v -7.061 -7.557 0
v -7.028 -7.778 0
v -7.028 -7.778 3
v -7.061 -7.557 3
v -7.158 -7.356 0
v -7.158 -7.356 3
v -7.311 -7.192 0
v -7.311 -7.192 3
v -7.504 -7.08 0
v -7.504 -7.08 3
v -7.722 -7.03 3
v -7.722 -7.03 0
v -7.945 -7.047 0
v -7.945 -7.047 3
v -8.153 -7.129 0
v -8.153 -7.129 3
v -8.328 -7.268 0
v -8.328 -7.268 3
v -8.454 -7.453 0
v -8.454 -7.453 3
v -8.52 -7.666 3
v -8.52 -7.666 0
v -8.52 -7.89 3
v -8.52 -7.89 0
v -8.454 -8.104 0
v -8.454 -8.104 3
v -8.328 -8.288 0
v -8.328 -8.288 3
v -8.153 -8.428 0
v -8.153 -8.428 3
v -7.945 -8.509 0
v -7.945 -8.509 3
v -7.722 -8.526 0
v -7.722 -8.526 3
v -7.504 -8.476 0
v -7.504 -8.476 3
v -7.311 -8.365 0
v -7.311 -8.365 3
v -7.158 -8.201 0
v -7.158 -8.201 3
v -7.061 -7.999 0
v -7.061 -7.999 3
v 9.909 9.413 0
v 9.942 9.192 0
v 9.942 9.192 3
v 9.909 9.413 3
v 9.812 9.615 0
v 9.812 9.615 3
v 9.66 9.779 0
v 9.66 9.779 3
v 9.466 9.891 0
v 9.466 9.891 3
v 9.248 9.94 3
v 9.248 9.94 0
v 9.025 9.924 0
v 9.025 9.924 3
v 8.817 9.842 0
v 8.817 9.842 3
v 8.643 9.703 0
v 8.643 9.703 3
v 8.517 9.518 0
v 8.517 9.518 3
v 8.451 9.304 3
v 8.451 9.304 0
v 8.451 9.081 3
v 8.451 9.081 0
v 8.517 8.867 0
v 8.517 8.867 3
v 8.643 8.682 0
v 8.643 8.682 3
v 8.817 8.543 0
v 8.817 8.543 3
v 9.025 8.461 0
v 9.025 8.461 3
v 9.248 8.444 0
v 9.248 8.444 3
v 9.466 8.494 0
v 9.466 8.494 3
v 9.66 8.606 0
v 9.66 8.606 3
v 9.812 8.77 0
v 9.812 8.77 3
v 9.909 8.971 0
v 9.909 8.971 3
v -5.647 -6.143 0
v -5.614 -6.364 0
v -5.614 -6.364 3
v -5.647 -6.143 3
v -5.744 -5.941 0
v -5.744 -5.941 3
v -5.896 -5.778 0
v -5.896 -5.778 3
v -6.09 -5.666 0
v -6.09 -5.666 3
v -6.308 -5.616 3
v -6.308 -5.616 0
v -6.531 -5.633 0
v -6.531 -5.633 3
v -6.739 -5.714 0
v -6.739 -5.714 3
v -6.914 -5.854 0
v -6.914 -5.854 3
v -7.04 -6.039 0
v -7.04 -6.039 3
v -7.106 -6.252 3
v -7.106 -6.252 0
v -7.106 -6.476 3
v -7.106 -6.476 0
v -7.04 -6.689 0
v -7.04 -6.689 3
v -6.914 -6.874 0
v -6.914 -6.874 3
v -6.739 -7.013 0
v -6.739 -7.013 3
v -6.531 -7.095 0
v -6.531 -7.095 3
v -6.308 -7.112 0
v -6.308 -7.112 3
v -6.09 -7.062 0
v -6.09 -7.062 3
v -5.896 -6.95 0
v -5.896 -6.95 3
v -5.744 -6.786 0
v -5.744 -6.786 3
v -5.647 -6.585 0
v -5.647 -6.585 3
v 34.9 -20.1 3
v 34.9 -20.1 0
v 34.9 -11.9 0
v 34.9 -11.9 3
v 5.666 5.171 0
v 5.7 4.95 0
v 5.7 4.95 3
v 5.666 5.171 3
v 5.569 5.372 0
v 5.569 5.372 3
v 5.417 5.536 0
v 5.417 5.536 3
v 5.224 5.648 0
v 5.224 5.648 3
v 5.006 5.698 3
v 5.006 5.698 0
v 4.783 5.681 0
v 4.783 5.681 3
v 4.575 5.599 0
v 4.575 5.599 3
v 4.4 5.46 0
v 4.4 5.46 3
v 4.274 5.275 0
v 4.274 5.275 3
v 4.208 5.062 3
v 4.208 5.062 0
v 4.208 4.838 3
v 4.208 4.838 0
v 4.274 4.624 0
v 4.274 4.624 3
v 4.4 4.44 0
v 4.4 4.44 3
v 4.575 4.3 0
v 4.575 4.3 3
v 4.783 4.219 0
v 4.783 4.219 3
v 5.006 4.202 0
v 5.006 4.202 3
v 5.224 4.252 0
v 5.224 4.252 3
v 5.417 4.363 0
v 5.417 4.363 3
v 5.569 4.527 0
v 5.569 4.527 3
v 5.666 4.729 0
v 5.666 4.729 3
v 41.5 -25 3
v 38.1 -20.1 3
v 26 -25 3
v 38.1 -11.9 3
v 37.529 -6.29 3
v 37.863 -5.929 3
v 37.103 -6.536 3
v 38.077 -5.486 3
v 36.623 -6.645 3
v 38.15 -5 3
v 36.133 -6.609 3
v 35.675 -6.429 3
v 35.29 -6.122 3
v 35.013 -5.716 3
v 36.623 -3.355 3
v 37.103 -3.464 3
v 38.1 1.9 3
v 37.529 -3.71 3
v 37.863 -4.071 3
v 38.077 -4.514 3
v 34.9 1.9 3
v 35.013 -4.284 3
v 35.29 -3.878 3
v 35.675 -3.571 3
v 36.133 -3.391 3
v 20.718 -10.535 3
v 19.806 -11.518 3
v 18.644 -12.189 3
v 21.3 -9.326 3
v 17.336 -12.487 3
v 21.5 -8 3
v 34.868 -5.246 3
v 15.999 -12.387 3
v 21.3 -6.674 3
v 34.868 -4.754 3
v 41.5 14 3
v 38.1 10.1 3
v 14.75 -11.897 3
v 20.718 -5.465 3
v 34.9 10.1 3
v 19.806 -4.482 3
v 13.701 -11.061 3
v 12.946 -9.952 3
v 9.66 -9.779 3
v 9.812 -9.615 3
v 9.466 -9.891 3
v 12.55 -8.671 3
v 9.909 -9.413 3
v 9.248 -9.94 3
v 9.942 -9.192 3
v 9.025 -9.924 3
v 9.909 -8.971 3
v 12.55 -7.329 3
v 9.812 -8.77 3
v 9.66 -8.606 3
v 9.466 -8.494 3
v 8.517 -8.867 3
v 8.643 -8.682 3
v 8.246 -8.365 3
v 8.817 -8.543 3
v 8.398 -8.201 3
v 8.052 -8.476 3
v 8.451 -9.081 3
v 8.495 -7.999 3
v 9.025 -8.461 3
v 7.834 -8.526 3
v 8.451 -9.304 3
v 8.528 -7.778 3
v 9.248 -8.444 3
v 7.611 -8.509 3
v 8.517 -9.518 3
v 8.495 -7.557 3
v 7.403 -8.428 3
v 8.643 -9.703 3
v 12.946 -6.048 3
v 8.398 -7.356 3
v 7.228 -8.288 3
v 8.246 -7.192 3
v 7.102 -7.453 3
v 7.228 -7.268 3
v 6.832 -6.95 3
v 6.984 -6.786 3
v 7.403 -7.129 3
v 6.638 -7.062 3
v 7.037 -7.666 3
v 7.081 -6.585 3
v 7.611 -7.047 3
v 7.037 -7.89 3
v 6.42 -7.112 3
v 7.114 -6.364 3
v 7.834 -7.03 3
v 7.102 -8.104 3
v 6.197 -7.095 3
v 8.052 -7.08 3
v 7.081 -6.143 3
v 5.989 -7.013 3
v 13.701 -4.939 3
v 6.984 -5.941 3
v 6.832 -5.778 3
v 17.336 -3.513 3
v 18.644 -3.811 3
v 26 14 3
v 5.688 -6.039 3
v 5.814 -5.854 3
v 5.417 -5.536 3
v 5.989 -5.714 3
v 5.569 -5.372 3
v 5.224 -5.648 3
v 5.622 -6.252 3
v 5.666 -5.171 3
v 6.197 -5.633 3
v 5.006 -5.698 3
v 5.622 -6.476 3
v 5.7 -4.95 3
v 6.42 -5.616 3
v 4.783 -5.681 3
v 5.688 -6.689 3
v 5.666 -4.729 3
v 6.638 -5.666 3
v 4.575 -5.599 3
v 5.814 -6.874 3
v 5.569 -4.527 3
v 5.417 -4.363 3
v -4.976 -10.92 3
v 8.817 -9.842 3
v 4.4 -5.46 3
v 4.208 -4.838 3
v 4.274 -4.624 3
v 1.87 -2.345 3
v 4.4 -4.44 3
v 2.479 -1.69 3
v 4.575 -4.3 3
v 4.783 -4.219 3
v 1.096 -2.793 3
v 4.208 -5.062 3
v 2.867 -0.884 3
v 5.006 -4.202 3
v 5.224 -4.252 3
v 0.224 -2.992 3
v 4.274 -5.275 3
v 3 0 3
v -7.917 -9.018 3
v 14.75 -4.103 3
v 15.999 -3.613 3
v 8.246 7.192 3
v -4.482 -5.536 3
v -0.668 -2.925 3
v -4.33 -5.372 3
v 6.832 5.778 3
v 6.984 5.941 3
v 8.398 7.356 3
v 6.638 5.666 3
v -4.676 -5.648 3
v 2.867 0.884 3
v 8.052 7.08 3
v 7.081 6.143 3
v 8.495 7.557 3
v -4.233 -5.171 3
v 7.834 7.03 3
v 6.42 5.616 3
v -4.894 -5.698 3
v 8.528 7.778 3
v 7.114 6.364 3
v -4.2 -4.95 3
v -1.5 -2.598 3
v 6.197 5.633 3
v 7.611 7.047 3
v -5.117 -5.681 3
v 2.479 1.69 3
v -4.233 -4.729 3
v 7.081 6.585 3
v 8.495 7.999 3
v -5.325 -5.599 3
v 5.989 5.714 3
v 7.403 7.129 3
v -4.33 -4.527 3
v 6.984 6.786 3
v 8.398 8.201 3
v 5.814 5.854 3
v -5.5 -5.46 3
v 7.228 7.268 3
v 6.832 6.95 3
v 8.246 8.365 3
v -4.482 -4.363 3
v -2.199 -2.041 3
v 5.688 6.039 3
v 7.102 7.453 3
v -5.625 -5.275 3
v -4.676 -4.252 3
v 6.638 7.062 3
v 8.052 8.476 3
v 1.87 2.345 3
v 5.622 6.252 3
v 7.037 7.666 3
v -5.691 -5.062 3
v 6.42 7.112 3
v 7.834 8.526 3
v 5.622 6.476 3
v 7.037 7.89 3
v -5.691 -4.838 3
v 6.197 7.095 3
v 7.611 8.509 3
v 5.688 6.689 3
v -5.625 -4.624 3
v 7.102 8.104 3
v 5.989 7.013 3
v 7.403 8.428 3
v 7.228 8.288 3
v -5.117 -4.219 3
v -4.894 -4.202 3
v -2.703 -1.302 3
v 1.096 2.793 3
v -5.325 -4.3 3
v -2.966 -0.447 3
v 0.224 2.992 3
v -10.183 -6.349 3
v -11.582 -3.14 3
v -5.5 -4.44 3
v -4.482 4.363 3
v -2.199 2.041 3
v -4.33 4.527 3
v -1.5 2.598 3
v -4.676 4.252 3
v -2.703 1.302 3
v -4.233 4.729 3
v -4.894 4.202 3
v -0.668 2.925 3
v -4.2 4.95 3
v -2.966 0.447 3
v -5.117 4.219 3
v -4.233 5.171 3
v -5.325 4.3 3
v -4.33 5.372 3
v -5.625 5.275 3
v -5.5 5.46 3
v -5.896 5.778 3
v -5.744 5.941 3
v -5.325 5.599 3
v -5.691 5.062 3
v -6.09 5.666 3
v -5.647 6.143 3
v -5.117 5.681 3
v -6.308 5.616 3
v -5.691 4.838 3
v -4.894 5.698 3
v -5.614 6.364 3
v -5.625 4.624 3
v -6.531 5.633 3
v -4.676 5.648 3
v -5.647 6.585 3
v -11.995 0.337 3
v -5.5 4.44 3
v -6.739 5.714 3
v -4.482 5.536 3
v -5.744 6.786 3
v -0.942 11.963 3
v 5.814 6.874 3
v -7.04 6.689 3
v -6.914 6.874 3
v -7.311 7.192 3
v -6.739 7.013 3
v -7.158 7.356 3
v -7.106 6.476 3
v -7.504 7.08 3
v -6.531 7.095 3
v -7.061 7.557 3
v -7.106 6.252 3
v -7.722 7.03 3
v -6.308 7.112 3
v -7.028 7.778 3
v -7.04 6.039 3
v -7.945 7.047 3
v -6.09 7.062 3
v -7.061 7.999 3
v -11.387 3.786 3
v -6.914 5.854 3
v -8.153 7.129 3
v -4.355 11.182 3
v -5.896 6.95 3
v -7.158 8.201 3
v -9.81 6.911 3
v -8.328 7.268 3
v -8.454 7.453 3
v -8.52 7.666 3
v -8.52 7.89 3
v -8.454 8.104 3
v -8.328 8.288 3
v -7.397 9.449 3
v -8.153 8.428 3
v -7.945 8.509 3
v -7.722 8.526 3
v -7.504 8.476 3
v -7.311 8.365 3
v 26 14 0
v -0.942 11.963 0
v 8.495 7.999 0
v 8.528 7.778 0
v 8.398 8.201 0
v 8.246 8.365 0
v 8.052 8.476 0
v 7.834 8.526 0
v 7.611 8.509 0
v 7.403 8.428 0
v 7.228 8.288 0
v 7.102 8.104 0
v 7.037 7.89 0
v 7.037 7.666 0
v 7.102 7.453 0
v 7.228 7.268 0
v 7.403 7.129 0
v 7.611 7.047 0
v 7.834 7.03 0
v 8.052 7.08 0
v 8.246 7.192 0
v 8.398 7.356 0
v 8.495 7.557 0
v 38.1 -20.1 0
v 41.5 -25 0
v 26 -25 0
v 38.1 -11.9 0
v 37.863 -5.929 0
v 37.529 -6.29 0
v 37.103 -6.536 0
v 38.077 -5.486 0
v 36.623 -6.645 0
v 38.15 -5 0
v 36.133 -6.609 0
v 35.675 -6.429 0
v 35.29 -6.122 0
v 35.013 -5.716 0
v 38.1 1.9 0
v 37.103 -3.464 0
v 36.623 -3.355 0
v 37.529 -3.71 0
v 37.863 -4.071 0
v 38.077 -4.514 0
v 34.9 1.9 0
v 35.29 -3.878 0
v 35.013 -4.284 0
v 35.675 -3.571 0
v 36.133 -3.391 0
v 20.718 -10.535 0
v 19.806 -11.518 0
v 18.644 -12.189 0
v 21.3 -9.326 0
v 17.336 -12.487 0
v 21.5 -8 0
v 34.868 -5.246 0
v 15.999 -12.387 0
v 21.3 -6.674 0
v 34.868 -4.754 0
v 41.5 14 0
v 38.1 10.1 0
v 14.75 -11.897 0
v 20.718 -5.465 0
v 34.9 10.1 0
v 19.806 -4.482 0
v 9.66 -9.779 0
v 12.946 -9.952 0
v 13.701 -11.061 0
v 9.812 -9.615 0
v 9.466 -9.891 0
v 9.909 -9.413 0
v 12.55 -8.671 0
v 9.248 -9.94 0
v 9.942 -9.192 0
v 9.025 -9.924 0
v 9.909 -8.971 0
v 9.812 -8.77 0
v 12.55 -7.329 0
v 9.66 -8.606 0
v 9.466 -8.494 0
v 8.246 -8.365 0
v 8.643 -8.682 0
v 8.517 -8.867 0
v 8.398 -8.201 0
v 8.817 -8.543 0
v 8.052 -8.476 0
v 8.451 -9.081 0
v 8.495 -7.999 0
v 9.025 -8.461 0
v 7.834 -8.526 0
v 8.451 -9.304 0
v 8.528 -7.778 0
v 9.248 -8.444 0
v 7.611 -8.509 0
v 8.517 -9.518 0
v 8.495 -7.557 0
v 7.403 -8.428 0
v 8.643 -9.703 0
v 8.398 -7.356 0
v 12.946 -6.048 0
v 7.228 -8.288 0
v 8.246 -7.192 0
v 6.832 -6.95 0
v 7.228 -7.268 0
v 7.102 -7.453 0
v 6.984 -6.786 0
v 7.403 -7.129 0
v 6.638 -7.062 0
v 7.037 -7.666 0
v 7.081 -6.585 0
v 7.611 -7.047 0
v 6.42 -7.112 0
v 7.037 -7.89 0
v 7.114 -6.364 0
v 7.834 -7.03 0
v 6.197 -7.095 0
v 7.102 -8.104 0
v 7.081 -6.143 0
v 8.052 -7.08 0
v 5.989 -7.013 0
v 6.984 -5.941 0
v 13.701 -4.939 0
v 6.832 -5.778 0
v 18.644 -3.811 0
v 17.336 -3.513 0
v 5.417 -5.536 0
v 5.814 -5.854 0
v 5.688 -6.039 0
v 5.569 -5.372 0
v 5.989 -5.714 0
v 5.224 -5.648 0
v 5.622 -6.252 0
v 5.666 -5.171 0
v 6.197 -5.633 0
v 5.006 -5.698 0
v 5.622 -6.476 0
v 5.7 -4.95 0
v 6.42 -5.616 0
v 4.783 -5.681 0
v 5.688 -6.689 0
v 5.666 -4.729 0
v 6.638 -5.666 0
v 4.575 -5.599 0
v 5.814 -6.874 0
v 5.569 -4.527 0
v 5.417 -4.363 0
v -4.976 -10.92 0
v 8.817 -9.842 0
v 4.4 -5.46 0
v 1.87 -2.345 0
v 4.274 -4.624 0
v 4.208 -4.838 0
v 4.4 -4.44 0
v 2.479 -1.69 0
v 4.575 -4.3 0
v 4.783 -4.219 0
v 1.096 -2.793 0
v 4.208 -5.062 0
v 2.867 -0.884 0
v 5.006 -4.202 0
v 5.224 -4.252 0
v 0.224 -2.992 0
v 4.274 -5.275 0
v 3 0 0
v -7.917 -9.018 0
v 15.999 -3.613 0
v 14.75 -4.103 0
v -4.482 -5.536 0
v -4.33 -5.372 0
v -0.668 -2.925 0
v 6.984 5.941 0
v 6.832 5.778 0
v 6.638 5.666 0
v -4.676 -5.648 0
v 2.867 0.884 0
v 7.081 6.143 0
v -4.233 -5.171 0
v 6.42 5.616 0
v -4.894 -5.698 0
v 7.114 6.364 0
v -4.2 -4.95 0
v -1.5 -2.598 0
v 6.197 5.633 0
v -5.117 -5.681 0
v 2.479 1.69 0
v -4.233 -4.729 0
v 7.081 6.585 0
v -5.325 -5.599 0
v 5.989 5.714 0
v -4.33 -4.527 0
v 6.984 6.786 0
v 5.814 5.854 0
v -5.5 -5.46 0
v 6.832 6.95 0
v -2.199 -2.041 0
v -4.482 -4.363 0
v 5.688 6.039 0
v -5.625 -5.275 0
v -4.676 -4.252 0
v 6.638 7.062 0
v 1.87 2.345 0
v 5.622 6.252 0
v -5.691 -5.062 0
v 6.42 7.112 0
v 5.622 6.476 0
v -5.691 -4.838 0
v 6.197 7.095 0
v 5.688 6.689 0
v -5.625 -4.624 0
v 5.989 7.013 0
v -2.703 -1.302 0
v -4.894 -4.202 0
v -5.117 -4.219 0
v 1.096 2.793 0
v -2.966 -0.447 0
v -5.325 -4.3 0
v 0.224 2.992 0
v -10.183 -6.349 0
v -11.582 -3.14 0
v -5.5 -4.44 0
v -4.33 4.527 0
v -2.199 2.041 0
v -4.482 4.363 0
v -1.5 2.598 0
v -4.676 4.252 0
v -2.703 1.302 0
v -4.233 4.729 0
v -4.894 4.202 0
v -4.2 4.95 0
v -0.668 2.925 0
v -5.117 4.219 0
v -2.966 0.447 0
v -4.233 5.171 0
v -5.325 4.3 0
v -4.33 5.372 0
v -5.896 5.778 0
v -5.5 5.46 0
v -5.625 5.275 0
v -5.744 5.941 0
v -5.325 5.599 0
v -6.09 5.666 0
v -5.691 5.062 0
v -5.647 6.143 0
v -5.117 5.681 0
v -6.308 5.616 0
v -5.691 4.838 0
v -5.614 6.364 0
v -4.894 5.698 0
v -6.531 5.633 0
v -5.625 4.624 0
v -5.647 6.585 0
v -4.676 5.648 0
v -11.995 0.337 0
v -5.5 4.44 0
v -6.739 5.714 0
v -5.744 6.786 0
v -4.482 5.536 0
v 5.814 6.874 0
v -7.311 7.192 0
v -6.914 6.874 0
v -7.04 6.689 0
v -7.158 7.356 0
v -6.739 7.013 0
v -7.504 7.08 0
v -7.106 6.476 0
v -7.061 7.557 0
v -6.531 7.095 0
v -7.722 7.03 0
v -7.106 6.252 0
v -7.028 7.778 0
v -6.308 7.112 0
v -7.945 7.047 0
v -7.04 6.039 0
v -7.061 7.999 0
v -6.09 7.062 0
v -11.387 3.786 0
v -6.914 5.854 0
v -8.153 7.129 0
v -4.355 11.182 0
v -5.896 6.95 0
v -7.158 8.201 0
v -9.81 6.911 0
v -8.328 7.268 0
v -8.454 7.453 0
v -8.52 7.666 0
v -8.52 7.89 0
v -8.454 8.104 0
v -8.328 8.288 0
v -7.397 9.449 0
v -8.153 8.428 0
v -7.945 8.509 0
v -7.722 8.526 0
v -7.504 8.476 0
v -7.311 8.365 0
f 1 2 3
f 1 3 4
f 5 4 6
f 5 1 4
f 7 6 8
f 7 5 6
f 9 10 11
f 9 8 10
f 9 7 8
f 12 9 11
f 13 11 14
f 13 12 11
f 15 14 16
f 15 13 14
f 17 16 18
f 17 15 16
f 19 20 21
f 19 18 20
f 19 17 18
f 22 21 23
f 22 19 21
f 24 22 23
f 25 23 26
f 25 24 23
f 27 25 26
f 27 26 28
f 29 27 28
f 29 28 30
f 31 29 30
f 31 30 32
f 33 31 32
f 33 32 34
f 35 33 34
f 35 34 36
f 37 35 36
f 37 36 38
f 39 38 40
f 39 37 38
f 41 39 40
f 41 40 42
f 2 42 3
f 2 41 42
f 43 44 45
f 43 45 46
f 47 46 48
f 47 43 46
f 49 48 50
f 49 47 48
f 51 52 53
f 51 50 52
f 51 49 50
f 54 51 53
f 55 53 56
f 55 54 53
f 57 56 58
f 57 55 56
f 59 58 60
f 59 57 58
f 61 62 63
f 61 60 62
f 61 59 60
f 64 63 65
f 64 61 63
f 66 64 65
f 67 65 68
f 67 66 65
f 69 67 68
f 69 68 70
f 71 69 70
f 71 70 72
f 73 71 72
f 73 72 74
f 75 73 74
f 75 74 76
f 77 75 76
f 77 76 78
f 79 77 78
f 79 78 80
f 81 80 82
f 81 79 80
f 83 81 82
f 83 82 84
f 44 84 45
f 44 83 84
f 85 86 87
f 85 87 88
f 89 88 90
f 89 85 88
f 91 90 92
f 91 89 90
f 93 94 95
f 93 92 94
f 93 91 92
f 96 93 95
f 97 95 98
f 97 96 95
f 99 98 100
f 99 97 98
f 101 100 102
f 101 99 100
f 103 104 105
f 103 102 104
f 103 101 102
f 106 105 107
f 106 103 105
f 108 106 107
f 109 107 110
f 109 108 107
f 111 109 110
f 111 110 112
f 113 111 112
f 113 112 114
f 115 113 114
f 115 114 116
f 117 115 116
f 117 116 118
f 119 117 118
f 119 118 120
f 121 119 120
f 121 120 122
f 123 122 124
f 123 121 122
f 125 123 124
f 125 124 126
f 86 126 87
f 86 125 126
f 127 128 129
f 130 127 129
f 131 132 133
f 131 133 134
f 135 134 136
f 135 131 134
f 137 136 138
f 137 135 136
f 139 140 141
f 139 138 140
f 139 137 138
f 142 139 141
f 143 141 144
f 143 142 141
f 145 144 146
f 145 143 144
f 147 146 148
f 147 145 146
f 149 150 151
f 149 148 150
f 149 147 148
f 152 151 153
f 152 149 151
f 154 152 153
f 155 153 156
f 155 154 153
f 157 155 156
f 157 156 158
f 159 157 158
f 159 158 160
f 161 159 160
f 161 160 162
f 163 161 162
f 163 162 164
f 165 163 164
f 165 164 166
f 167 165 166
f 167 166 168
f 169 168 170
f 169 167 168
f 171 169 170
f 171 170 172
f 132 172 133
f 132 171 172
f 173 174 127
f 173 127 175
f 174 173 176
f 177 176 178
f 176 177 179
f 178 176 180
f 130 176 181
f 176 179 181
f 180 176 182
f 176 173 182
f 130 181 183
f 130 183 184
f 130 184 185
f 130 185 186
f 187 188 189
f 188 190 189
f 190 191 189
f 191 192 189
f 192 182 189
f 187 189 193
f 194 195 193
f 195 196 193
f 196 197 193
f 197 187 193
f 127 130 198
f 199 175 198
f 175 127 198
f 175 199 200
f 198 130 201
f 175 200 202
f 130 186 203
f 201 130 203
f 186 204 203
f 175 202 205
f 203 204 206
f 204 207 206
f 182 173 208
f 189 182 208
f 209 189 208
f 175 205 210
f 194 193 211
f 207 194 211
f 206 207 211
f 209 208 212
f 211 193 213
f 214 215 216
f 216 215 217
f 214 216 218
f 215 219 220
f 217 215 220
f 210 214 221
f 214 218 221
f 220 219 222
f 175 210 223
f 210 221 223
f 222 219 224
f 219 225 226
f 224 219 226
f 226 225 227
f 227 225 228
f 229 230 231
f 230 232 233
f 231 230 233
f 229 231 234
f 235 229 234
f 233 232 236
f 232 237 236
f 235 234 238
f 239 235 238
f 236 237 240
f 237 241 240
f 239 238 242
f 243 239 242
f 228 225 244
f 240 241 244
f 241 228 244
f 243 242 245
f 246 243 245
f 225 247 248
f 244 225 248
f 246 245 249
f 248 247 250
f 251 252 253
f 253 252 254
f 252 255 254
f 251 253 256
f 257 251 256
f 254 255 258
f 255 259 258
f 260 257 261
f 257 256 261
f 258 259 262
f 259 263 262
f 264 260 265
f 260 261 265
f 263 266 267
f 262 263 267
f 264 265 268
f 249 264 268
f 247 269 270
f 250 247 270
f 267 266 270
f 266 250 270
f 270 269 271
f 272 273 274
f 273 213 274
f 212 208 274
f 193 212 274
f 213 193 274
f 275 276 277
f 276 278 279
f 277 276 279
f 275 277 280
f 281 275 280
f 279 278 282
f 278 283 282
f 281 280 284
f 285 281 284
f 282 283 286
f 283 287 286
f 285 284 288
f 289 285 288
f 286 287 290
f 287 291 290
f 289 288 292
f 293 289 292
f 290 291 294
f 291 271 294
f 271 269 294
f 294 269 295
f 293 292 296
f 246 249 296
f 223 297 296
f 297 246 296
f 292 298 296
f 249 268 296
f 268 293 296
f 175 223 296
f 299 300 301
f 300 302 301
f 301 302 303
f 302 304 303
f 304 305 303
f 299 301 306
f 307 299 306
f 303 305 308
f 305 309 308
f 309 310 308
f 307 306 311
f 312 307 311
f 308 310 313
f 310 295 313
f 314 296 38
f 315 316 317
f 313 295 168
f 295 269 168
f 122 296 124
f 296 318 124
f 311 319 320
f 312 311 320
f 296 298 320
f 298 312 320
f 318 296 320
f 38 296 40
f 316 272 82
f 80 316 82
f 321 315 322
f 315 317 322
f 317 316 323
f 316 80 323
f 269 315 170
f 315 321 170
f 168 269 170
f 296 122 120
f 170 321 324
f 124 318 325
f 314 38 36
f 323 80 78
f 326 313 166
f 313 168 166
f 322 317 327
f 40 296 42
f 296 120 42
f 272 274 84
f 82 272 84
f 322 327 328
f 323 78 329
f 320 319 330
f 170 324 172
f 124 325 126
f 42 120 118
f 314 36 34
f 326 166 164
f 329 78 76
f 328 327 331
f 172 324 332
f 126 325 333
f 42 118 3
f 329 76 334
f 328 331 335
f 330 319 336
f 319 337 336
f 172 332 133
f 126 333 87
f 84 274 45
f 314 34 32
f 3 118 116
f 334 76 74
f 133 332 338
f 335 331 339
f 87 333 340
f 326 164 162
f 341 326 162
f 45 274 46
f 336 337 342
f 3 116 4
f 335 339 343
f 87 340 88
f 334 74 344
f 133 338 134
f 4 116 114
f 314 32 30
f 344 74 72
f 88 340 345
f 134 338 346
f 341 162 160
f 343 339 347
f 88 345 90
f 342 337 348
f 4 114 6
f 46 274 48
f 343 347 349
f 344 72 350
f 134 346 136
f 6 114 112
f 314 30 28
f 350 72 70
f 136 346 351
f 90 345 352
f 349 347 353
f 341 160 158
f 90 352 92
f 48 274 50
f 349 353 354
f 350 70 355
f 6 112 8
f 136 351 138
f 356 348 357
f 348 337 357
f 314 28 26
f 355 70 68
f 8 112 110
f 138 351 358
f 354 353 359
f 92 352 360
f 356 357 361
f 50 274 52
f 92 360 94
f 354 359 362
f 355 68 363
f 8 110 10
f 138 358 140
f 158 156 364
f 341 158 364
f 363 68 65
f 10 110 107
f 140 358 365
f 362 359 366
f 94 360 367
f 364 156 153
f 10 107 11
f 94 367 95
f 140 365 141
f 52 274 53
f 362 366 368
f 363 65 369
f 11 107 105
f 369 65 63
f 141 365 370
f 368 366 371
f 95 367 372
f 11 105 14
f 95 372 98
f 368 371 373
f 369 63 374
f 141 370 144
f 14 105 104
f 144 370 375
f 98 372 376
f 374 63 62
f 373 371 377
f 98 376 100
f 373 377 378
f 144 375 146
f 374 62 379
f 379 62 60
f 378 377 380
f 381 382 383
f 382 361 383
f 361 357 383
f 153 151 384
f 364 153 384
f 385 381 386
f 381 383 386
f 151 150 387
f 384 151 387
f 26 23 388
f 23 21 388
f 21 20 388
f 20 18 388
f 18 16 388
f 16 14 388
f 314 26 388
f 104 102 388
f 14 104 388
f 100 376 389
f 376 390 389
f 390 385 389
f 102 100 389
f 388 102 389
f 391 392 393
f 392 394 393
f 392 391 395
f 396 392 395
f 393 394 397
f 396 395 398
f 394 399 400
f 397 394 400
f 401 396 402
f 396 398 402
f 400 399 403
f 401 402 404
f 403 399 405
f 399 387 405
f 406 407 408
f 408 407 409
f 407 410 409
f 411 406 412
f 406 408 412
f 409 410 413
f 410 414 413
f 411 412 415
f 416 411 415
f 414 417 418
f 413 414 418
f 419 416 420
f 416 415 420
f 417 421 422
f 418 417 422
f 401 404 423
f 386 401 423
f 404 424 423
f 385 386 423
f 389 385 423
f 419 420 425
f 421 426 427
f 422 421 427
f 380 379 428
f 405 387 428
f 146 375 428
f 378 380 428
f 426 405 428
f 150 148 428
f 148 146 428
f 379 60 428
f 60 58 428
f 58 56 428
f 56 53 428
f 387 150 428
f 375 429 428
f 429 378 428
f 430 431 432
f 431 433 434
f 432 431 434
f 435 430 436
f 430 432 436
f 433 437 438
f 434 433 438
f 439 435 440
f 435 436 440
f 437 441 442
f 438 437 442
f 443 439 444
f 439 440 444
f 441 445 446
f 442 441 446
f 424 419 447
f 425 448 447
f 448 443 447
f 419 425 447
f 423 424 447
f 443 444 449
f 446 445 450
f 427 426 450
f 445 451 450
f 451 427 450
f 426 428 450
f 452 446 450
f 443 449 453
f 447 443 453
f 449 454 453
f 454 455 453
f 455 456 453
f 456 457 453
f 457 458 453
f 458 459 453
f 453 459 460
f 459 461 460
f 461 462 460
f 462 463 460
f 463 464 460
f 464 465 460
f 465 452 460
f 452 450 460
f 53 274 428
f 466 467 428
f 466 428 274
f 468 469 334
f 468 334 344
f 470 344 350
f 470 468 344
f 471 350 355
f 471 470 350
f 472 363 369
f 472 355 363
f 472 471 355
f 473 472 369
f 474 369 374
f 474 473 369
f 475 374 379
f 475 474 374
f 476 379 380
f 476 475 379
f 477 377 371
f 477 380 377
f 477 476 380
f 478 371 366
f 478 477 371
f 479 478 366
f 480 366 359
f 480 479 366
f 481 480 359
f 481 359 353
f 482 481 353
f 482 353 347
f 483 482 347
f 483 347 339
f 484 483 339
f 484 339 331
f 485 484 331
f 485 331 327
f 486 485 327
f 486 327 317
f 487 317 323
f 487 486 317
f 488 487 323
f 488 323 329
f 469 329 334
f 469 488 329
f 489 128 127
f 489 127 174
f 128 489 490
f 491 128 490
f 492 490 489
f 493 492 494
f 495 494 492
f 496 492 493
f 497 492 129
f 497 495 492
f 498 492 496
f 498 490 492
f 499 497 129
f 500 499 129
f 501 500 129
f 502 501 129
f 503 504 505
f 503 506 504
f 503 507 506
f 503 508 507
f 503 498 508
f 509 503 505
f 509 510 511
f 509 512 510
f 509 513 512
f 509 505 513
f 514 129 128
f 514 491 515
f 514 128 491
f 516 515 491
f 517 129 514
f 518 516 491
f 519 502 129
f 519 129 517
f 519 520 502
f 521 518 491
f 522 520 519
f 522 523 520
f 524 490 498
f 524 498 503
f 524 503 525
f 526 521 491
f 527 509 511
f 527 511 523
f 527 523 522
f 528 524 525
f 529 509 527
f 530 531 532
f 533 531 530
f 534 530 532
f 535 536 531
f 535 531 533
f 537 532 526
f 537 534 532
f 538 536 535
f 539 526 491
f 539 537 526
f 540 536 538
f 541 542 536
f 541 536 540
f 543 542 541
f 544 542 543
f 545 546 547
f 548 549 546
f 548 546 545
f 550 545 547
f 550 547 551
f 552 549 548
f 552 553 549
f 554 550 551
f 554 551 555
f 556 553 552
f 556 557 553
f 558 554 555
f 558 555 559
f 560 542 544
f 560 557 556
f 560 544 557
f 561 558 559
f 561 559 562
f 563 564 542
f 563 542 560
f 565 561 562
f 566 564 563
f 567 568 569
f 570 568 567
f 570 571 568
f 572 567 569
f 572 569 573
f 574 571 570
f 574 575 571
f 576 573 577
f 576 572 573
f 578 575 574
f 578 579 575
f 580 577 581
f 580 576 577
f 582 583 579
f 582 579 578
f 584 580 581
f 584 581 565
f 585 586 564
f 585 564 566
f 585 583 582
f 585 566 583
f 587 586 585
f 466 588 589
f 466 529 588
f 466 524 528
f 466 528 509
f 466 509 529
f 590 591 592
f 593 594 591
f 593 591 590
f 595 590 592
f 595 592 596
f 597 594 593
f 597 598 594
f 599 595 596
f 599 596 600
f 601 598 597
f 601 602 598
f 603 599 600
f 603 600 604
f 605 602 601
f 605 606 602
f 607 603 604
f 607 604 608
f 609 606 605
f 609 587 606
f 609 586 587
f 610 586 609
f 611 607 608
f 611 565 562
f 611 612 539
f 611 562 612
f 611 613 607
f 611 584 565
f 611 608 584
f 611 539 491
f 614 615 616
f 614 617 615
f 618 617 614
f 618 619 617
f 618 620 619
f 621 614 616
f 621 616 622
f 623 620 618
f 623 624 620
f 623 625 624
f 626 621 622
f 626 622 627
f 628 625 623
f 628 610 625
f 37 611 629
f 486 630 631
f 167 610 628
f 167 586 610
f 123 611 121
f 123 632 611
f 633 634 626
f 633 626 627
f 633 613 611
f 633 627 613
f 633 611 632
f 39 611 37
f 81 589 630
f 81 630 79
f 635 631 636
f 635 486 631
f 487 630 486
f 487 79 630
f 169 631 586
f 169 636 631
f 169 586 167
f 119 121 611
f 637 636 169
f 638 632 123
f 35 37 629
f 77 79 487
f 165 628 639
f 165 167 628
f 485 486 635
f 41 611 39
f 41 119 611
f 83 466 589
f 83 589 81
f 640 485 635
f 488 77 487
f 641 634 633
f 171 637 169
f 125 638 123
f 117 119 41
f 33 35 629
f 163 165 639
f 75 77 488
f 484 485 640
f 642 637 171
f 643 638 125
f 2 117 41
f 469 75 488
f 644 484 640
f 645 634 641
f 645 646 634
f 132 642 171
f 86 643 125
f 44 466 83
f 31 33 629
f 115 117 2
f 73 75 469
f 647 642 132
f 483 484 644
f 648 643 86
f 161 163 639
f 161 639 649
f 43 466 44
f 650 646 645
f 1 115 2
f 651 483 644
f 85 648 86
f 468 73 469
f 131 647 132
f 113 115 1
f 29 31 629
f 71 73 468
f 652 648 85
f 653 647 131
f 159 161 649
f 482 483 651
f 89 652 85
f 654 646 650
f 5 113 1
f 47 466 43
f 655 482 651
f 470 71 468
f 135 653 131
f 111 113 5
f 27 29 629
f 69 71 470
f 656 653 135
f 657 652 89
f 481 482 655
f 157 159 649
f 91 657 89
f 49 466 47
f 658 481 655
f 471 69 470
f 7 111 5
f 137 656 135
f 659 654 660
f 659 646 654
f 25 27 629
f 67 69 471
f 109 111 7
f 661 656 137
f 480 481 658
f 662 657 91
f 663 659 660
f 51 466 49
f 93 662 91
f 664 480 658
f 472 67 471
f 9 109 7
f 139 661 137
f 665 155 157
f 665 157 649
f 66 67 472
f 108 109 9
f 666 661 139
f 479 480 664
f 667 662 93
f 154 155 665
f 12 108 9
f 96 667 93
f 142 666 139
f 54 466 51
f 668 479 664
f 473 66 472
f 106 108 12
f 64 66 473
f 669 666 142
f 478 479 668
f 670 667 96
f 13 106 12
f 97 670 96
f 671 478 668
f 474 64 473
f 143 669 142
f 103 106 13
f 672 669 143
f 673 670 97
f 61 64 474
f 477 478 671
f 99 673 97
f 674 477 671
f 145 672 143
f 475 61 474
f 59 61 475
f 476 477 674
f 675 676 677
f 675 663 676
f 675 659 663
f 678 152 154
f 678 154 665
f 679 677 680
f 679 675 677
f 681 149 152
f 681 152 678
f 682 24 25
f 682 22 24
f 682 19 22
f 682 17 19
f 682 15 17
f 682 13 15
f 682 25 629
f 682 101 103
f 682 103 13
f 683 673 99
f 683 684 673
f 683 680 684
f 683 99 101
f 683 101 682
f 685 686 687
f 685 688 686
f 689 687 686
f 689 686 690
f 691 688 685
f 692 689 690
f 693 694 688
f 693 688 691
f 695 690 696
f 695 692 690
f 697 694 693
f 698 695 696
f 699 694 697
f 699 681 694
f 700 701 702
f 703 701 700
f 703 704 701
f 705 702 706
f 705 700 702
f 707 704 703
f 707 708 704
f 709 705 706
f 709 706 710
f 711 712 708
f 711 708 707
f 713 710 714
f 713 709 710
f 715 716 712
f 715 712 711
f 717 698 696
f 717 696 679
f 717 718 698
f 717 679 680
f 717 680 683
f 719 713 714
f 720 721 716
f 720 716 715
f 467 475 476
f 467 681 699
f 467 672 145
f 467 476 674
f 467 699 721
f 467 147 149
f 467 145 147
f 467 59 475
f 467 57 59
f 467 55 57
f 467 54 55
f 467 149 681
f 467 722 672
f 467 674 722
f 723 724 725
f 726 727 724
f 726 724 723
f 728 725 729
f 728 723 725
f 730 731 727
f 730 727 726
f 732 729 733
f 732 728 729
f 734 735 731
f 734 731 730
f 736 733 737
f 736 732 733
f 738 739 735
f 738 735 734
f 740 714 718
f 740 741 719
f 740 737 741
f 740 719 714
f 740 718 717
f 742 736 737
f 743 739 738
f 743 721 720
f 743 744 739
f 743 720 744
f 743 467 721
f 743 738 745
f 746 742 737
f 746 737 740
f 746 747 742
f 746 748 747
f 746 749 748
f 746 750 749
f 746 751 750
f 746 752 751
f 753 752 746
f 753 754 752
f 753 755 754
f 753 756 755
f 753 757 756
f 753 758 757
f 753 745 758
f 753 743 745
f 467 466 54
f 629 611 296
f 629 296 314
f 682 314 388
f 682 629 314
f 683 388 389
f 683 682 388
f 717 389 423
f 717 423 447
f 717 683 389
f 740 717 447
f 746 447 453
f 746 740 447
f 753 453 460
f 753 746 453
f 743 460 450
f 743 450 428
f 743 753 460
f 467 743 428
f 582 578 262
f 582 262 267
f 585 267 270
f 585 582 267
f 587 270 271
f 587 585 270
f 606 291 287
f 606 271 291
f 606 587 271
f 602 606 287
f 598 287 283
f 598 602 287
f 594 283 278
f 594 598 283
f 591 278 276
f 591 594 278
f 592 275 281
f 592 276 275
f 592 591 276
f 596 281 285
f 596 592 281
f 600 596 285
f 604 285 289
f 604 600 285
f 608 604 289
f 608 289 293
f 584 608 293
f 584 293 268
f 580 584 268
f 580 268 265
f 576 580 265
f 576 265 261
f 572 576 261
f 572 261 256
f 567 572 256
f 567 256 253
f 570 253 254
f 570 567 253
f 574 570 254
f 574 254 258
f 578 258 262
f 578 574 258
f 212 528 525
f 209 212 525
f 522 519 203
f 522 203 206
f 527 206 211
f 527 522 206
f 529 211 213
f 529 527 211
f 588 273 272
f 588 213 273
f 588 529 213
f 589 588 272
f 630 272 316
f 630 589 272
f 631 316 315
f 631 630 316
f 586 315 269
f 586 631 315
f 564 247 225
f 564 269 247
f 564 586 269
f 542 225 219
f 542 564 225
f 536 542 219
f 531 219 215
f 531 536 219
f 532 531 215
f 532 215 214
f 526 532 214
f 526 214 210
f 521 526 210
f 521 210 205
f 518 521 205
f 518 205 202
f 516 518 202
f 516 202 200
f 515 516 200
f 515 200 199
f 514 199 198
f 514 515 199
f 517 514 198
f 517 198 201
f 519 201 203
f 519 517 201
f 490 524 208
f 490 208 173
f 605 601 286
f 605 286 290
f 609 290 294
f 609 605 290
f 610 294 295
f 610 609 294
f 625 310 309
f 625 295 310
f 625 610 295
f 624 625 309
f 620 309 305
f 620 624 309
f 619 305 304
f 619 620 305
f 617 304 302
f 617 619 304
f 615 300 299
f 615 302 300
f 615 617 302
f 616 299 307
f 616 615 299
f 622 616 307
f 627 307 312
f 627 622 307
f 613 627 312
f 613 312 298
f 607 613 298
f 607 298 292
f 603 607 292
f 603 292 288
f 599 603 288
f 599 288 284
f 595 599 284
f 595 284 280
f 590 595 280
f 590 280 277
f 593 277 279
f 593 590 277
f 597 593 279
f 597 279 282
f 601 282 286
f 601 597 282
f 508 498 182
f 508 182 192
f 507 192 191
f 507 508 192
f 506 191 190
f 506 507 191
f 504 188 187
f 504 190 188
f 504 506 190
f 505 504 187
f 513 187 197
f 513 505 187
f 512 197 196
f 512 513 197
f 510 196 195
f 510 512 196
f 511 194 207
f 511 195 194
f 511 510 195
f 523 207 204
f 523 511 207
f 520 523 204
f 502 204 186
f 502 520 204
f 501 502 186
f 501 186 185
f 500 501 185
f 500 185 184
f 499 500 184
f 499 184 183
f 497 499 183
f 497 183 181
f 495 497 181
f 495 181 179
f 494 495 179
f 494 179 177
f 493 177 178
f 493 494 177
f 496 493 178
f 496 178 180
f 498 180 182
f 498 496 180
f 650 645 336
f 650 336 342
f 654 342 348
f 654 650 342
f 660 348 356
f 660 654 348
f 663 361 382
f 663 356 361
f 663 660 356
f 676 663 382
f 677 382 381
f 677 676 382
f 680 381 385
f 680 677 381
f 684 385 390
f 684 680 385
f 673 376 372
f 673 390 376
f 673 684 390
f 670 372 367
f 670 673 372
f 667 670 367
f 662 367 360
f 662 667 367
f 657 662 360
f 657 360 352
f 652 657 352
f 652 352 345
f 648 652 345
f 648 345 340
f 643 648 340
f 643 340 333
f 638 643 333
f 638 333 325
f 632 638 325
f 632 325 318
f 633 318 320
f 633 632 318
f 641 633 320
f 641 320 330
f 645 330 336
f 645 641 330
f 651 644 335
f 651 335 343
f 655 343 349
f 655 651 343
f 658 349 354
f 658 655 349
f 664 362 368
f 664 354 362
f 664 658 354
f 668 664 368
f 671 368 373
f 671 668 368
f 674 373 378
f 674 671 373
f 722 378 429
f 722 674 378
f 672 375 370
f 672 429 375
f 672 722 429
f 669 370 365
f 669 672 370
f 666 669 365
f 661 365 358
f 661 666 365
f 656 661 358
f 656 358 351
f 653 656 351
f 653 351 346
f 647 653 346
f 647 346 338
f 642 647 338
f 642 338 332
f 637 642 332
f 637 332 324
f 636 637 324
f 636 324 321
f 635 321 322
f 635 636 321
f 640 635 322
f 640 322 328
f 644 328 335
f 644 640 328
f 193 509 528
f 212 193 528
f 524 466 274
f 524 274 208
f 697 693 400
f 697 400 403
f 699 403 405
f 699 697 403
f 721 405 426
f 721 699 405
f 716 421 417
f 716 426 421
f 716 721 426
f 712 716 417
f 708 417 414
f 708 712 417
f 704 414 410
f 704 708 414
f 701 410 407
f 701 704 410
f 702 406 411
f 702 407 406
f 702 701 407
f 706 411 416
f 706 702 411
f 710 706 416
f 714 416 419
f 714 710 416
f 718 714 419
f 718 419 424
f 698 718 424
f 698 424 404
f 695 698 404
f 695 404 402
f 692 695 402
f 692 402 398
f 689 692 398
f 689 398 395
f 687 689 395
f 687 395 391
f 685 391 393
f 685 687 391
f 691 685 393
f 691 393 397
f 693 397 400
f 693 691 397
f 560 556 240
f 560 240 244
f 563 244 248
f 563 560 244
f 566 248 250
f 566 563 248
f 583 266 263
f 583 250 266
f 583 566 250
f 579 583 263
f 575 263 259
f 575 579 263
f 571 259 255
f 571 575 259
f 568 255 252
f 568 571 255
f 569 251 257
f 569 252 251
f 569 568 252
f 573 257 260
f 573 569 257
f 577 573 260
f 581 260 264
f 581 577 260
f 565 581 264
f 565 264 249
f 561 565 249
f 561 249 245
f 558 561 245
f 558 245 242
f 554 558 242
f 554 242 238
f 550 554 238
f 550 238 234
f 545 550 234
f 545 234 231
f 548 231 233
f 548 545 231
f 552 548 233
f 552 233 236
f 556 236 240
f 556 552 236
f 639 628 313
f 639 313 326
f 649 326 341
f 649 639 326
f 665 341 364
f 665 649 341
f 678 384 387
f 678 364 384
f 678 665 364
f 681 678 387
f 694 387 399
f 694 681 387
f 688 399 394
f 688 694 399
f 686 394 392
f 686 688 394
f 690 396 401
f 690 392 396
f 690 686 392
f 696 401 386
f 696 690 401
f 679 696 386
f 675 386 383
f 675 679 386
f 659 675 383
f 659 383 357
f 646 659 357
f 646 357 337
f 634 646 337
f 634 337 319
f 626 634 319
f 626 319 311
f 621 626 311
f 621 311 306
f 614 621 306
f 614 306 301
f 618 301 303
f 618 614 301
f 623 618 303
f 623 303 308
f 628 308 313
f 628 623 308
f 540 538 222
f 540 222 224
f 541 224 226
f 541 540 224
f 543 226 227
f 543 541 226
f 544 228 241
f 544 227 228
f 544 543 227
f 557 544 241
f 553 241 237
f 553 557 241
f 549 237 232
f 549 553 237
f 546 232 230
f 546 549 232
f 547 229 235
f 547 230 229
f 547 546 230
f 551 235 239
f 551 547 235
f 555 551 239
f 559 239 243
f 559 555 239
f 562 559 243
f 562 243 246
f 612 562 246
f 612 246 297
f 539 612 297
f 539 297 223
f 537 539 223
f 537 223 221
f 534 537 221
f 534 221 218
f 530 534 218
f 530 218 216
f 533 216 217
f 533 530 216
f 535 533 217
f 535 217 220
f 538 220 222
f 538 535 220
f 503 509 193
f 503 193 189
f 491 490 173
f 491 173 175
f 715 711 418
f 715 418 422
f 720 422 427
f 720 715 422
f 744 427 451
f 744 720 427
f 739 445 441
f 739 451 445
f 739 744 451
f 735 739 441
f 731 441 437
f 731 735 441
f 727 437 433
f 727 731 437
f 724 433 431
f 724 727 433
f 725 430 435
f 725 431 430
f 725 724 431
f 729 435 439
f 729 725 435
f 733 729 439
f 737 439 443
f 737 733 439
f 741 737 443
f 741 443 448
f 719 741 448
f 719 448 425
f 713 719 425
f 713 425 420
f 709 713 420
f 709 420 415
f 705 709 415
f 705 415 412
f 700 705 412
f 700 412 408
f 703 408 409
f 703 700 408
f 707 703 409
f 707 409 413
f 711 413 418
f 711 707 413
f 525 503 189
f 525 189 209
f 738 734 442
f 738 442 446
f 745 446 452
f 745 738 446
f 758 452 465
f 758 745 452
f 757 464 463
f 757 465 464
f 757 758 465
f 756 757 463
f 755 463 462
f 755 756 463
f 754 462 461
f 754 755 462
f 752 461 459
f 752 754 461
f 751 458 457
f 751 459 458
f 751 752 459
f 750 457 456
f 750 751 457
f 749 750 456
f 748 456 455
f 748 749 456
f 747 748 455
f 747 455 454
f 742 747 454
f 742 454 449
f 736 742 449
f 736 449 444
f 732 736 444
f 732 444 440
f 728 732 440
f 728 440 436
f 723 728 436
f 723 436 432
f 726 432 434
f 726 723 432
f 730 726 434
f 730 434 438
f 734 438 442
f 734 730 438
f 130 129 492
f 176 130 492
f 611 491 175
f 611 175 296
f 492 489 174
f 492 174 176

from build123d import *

# Parameters (mm, degrees)
ESKIZ_KONTUR_W        = 3.2
ESKIZ_KONTUR_H        = 8.2
PLASTINA_DEPTH        = 3
OTVERSTIYA_DEPTH      = 49.541218109
OTVERSTIYA_DEPTH_BACK = 49.541218109
ESKIZ_OTVERSTIYA_R    = 0.75
ESKIZ_OTVERSTIYA_R_2  = 4.5
ESKIZ_OTVERSTIYA_R_3  = 3
ESKIZ_OTVERSTIYA_R_4  = 1.65


with BuildPart() as part:
    # Eskiz_kontur → Plastina (new body)
    with BuildSketch(Plane.XY):
        with BuildLine():
            Line((41.499998426, -24.999999723), (25.999998426, -24.999999723))
            Line((25.999998426, -24.999999723), (-4.976321574, -10.919529723))
            ThreePointArc((-4.976321574, -10.919529723), (-11.817691954, 2.083782335), (-0.94151, 11.96301))
            Line((-0.94151, 11.96301), (26, 14))
            Line((26, 14), (41.499998426, 14))
            Line((41.499998426, 14), (41.499998426, -24.999999723))
        make_face()
        with Locations((36.5, -16)):
            Rectangle(ESKIZ_KONTUR_W, ESKIZ_KONTUR_H, mode=Mode.SUBTRACT)
        with Locations((36.5, 6)):
            Rectangle(ESKIZ_KONTUR_W, ESKIZ_KONTUR_H, mode=Mode.SUBTRACT)
    extrude(amount=PLASTINA_DEPTH)

    # Eskiz_otverstiya → Otverstiya (cut, two sides: drawn at the far end of the back side and taken through both)
    with BuildSketch(Plane.XY.offset(-OTVERSTIYA_DEPTH_BACK)):
        with Locations((-7.77817, -7.77817)):
            Circle(ESKIZ_OTVERSTIYA_R)
        with Locations((-6.36396, -6.36396)):
            Circle(ESKIZ_OTVERSTIYA_R)
        with Locations((9.19239, -9.19239)):
            Circle(ESKIZ_OTVERSTIYA_R)
        with Locations((7.77817, -7.77817)):
            Circle(ESKIZ_OTVERSTIYA_R)
        with Locations((6.36396, -6.36396)):
            Circle(ESKIZ_OTVERSTIYA_R)
        with Locations((17, -8)):
            Circle(ESKIZ_OTVERSTIYA_R_2)
        with Locations((-4.94975, -4.94975)):
            Circle(ESKIZ_OTVERSTIYA_R)
        Circle(ESKIZ_OTVERSTIYA_R_3)
        with Locations((4.94975, -4.94975)):
            Circle(ESKIZ_OTVERSTIYA_R)
        with Locations((-4.94975, 4.94975)):
            Circle(ESKIZ_OTVERSTIYA_R)
        with Locations((-6.36396, 6.36396)):
            Circle(ESKIZ_OTVERSTIYA_R)
        with Locations((-7.77817, 7.77817)):
            Circle(ESKIZ_OTVERSTIYA_R)
        with Locations((4.94975, 4.94975)):
            Circle(ESKIZ_OTVERSTIYA_R)
        with Locations((6.36396, 6.36396)):
            Circle(ESKIZ_OTVERSTIYA_R)
        with Locations((7.77817, 7.77817)):
            Circle(ESKIZ_OTVERSTIYA_R)
        with Locations((9.19239, 9.19239)):
            Circle(ESKIZ_OTVERSTIYA_R)
        with Locations((36.5, -5)):
            Circle(ESKIZ_OTVERSTIYA_R_4)
    extrude(amount=OTVERSTIYA_DEPTH + OTVERSTIYA_DEPTH_BACK, mode=Mode.SUBTRACT)


solid = part.part
